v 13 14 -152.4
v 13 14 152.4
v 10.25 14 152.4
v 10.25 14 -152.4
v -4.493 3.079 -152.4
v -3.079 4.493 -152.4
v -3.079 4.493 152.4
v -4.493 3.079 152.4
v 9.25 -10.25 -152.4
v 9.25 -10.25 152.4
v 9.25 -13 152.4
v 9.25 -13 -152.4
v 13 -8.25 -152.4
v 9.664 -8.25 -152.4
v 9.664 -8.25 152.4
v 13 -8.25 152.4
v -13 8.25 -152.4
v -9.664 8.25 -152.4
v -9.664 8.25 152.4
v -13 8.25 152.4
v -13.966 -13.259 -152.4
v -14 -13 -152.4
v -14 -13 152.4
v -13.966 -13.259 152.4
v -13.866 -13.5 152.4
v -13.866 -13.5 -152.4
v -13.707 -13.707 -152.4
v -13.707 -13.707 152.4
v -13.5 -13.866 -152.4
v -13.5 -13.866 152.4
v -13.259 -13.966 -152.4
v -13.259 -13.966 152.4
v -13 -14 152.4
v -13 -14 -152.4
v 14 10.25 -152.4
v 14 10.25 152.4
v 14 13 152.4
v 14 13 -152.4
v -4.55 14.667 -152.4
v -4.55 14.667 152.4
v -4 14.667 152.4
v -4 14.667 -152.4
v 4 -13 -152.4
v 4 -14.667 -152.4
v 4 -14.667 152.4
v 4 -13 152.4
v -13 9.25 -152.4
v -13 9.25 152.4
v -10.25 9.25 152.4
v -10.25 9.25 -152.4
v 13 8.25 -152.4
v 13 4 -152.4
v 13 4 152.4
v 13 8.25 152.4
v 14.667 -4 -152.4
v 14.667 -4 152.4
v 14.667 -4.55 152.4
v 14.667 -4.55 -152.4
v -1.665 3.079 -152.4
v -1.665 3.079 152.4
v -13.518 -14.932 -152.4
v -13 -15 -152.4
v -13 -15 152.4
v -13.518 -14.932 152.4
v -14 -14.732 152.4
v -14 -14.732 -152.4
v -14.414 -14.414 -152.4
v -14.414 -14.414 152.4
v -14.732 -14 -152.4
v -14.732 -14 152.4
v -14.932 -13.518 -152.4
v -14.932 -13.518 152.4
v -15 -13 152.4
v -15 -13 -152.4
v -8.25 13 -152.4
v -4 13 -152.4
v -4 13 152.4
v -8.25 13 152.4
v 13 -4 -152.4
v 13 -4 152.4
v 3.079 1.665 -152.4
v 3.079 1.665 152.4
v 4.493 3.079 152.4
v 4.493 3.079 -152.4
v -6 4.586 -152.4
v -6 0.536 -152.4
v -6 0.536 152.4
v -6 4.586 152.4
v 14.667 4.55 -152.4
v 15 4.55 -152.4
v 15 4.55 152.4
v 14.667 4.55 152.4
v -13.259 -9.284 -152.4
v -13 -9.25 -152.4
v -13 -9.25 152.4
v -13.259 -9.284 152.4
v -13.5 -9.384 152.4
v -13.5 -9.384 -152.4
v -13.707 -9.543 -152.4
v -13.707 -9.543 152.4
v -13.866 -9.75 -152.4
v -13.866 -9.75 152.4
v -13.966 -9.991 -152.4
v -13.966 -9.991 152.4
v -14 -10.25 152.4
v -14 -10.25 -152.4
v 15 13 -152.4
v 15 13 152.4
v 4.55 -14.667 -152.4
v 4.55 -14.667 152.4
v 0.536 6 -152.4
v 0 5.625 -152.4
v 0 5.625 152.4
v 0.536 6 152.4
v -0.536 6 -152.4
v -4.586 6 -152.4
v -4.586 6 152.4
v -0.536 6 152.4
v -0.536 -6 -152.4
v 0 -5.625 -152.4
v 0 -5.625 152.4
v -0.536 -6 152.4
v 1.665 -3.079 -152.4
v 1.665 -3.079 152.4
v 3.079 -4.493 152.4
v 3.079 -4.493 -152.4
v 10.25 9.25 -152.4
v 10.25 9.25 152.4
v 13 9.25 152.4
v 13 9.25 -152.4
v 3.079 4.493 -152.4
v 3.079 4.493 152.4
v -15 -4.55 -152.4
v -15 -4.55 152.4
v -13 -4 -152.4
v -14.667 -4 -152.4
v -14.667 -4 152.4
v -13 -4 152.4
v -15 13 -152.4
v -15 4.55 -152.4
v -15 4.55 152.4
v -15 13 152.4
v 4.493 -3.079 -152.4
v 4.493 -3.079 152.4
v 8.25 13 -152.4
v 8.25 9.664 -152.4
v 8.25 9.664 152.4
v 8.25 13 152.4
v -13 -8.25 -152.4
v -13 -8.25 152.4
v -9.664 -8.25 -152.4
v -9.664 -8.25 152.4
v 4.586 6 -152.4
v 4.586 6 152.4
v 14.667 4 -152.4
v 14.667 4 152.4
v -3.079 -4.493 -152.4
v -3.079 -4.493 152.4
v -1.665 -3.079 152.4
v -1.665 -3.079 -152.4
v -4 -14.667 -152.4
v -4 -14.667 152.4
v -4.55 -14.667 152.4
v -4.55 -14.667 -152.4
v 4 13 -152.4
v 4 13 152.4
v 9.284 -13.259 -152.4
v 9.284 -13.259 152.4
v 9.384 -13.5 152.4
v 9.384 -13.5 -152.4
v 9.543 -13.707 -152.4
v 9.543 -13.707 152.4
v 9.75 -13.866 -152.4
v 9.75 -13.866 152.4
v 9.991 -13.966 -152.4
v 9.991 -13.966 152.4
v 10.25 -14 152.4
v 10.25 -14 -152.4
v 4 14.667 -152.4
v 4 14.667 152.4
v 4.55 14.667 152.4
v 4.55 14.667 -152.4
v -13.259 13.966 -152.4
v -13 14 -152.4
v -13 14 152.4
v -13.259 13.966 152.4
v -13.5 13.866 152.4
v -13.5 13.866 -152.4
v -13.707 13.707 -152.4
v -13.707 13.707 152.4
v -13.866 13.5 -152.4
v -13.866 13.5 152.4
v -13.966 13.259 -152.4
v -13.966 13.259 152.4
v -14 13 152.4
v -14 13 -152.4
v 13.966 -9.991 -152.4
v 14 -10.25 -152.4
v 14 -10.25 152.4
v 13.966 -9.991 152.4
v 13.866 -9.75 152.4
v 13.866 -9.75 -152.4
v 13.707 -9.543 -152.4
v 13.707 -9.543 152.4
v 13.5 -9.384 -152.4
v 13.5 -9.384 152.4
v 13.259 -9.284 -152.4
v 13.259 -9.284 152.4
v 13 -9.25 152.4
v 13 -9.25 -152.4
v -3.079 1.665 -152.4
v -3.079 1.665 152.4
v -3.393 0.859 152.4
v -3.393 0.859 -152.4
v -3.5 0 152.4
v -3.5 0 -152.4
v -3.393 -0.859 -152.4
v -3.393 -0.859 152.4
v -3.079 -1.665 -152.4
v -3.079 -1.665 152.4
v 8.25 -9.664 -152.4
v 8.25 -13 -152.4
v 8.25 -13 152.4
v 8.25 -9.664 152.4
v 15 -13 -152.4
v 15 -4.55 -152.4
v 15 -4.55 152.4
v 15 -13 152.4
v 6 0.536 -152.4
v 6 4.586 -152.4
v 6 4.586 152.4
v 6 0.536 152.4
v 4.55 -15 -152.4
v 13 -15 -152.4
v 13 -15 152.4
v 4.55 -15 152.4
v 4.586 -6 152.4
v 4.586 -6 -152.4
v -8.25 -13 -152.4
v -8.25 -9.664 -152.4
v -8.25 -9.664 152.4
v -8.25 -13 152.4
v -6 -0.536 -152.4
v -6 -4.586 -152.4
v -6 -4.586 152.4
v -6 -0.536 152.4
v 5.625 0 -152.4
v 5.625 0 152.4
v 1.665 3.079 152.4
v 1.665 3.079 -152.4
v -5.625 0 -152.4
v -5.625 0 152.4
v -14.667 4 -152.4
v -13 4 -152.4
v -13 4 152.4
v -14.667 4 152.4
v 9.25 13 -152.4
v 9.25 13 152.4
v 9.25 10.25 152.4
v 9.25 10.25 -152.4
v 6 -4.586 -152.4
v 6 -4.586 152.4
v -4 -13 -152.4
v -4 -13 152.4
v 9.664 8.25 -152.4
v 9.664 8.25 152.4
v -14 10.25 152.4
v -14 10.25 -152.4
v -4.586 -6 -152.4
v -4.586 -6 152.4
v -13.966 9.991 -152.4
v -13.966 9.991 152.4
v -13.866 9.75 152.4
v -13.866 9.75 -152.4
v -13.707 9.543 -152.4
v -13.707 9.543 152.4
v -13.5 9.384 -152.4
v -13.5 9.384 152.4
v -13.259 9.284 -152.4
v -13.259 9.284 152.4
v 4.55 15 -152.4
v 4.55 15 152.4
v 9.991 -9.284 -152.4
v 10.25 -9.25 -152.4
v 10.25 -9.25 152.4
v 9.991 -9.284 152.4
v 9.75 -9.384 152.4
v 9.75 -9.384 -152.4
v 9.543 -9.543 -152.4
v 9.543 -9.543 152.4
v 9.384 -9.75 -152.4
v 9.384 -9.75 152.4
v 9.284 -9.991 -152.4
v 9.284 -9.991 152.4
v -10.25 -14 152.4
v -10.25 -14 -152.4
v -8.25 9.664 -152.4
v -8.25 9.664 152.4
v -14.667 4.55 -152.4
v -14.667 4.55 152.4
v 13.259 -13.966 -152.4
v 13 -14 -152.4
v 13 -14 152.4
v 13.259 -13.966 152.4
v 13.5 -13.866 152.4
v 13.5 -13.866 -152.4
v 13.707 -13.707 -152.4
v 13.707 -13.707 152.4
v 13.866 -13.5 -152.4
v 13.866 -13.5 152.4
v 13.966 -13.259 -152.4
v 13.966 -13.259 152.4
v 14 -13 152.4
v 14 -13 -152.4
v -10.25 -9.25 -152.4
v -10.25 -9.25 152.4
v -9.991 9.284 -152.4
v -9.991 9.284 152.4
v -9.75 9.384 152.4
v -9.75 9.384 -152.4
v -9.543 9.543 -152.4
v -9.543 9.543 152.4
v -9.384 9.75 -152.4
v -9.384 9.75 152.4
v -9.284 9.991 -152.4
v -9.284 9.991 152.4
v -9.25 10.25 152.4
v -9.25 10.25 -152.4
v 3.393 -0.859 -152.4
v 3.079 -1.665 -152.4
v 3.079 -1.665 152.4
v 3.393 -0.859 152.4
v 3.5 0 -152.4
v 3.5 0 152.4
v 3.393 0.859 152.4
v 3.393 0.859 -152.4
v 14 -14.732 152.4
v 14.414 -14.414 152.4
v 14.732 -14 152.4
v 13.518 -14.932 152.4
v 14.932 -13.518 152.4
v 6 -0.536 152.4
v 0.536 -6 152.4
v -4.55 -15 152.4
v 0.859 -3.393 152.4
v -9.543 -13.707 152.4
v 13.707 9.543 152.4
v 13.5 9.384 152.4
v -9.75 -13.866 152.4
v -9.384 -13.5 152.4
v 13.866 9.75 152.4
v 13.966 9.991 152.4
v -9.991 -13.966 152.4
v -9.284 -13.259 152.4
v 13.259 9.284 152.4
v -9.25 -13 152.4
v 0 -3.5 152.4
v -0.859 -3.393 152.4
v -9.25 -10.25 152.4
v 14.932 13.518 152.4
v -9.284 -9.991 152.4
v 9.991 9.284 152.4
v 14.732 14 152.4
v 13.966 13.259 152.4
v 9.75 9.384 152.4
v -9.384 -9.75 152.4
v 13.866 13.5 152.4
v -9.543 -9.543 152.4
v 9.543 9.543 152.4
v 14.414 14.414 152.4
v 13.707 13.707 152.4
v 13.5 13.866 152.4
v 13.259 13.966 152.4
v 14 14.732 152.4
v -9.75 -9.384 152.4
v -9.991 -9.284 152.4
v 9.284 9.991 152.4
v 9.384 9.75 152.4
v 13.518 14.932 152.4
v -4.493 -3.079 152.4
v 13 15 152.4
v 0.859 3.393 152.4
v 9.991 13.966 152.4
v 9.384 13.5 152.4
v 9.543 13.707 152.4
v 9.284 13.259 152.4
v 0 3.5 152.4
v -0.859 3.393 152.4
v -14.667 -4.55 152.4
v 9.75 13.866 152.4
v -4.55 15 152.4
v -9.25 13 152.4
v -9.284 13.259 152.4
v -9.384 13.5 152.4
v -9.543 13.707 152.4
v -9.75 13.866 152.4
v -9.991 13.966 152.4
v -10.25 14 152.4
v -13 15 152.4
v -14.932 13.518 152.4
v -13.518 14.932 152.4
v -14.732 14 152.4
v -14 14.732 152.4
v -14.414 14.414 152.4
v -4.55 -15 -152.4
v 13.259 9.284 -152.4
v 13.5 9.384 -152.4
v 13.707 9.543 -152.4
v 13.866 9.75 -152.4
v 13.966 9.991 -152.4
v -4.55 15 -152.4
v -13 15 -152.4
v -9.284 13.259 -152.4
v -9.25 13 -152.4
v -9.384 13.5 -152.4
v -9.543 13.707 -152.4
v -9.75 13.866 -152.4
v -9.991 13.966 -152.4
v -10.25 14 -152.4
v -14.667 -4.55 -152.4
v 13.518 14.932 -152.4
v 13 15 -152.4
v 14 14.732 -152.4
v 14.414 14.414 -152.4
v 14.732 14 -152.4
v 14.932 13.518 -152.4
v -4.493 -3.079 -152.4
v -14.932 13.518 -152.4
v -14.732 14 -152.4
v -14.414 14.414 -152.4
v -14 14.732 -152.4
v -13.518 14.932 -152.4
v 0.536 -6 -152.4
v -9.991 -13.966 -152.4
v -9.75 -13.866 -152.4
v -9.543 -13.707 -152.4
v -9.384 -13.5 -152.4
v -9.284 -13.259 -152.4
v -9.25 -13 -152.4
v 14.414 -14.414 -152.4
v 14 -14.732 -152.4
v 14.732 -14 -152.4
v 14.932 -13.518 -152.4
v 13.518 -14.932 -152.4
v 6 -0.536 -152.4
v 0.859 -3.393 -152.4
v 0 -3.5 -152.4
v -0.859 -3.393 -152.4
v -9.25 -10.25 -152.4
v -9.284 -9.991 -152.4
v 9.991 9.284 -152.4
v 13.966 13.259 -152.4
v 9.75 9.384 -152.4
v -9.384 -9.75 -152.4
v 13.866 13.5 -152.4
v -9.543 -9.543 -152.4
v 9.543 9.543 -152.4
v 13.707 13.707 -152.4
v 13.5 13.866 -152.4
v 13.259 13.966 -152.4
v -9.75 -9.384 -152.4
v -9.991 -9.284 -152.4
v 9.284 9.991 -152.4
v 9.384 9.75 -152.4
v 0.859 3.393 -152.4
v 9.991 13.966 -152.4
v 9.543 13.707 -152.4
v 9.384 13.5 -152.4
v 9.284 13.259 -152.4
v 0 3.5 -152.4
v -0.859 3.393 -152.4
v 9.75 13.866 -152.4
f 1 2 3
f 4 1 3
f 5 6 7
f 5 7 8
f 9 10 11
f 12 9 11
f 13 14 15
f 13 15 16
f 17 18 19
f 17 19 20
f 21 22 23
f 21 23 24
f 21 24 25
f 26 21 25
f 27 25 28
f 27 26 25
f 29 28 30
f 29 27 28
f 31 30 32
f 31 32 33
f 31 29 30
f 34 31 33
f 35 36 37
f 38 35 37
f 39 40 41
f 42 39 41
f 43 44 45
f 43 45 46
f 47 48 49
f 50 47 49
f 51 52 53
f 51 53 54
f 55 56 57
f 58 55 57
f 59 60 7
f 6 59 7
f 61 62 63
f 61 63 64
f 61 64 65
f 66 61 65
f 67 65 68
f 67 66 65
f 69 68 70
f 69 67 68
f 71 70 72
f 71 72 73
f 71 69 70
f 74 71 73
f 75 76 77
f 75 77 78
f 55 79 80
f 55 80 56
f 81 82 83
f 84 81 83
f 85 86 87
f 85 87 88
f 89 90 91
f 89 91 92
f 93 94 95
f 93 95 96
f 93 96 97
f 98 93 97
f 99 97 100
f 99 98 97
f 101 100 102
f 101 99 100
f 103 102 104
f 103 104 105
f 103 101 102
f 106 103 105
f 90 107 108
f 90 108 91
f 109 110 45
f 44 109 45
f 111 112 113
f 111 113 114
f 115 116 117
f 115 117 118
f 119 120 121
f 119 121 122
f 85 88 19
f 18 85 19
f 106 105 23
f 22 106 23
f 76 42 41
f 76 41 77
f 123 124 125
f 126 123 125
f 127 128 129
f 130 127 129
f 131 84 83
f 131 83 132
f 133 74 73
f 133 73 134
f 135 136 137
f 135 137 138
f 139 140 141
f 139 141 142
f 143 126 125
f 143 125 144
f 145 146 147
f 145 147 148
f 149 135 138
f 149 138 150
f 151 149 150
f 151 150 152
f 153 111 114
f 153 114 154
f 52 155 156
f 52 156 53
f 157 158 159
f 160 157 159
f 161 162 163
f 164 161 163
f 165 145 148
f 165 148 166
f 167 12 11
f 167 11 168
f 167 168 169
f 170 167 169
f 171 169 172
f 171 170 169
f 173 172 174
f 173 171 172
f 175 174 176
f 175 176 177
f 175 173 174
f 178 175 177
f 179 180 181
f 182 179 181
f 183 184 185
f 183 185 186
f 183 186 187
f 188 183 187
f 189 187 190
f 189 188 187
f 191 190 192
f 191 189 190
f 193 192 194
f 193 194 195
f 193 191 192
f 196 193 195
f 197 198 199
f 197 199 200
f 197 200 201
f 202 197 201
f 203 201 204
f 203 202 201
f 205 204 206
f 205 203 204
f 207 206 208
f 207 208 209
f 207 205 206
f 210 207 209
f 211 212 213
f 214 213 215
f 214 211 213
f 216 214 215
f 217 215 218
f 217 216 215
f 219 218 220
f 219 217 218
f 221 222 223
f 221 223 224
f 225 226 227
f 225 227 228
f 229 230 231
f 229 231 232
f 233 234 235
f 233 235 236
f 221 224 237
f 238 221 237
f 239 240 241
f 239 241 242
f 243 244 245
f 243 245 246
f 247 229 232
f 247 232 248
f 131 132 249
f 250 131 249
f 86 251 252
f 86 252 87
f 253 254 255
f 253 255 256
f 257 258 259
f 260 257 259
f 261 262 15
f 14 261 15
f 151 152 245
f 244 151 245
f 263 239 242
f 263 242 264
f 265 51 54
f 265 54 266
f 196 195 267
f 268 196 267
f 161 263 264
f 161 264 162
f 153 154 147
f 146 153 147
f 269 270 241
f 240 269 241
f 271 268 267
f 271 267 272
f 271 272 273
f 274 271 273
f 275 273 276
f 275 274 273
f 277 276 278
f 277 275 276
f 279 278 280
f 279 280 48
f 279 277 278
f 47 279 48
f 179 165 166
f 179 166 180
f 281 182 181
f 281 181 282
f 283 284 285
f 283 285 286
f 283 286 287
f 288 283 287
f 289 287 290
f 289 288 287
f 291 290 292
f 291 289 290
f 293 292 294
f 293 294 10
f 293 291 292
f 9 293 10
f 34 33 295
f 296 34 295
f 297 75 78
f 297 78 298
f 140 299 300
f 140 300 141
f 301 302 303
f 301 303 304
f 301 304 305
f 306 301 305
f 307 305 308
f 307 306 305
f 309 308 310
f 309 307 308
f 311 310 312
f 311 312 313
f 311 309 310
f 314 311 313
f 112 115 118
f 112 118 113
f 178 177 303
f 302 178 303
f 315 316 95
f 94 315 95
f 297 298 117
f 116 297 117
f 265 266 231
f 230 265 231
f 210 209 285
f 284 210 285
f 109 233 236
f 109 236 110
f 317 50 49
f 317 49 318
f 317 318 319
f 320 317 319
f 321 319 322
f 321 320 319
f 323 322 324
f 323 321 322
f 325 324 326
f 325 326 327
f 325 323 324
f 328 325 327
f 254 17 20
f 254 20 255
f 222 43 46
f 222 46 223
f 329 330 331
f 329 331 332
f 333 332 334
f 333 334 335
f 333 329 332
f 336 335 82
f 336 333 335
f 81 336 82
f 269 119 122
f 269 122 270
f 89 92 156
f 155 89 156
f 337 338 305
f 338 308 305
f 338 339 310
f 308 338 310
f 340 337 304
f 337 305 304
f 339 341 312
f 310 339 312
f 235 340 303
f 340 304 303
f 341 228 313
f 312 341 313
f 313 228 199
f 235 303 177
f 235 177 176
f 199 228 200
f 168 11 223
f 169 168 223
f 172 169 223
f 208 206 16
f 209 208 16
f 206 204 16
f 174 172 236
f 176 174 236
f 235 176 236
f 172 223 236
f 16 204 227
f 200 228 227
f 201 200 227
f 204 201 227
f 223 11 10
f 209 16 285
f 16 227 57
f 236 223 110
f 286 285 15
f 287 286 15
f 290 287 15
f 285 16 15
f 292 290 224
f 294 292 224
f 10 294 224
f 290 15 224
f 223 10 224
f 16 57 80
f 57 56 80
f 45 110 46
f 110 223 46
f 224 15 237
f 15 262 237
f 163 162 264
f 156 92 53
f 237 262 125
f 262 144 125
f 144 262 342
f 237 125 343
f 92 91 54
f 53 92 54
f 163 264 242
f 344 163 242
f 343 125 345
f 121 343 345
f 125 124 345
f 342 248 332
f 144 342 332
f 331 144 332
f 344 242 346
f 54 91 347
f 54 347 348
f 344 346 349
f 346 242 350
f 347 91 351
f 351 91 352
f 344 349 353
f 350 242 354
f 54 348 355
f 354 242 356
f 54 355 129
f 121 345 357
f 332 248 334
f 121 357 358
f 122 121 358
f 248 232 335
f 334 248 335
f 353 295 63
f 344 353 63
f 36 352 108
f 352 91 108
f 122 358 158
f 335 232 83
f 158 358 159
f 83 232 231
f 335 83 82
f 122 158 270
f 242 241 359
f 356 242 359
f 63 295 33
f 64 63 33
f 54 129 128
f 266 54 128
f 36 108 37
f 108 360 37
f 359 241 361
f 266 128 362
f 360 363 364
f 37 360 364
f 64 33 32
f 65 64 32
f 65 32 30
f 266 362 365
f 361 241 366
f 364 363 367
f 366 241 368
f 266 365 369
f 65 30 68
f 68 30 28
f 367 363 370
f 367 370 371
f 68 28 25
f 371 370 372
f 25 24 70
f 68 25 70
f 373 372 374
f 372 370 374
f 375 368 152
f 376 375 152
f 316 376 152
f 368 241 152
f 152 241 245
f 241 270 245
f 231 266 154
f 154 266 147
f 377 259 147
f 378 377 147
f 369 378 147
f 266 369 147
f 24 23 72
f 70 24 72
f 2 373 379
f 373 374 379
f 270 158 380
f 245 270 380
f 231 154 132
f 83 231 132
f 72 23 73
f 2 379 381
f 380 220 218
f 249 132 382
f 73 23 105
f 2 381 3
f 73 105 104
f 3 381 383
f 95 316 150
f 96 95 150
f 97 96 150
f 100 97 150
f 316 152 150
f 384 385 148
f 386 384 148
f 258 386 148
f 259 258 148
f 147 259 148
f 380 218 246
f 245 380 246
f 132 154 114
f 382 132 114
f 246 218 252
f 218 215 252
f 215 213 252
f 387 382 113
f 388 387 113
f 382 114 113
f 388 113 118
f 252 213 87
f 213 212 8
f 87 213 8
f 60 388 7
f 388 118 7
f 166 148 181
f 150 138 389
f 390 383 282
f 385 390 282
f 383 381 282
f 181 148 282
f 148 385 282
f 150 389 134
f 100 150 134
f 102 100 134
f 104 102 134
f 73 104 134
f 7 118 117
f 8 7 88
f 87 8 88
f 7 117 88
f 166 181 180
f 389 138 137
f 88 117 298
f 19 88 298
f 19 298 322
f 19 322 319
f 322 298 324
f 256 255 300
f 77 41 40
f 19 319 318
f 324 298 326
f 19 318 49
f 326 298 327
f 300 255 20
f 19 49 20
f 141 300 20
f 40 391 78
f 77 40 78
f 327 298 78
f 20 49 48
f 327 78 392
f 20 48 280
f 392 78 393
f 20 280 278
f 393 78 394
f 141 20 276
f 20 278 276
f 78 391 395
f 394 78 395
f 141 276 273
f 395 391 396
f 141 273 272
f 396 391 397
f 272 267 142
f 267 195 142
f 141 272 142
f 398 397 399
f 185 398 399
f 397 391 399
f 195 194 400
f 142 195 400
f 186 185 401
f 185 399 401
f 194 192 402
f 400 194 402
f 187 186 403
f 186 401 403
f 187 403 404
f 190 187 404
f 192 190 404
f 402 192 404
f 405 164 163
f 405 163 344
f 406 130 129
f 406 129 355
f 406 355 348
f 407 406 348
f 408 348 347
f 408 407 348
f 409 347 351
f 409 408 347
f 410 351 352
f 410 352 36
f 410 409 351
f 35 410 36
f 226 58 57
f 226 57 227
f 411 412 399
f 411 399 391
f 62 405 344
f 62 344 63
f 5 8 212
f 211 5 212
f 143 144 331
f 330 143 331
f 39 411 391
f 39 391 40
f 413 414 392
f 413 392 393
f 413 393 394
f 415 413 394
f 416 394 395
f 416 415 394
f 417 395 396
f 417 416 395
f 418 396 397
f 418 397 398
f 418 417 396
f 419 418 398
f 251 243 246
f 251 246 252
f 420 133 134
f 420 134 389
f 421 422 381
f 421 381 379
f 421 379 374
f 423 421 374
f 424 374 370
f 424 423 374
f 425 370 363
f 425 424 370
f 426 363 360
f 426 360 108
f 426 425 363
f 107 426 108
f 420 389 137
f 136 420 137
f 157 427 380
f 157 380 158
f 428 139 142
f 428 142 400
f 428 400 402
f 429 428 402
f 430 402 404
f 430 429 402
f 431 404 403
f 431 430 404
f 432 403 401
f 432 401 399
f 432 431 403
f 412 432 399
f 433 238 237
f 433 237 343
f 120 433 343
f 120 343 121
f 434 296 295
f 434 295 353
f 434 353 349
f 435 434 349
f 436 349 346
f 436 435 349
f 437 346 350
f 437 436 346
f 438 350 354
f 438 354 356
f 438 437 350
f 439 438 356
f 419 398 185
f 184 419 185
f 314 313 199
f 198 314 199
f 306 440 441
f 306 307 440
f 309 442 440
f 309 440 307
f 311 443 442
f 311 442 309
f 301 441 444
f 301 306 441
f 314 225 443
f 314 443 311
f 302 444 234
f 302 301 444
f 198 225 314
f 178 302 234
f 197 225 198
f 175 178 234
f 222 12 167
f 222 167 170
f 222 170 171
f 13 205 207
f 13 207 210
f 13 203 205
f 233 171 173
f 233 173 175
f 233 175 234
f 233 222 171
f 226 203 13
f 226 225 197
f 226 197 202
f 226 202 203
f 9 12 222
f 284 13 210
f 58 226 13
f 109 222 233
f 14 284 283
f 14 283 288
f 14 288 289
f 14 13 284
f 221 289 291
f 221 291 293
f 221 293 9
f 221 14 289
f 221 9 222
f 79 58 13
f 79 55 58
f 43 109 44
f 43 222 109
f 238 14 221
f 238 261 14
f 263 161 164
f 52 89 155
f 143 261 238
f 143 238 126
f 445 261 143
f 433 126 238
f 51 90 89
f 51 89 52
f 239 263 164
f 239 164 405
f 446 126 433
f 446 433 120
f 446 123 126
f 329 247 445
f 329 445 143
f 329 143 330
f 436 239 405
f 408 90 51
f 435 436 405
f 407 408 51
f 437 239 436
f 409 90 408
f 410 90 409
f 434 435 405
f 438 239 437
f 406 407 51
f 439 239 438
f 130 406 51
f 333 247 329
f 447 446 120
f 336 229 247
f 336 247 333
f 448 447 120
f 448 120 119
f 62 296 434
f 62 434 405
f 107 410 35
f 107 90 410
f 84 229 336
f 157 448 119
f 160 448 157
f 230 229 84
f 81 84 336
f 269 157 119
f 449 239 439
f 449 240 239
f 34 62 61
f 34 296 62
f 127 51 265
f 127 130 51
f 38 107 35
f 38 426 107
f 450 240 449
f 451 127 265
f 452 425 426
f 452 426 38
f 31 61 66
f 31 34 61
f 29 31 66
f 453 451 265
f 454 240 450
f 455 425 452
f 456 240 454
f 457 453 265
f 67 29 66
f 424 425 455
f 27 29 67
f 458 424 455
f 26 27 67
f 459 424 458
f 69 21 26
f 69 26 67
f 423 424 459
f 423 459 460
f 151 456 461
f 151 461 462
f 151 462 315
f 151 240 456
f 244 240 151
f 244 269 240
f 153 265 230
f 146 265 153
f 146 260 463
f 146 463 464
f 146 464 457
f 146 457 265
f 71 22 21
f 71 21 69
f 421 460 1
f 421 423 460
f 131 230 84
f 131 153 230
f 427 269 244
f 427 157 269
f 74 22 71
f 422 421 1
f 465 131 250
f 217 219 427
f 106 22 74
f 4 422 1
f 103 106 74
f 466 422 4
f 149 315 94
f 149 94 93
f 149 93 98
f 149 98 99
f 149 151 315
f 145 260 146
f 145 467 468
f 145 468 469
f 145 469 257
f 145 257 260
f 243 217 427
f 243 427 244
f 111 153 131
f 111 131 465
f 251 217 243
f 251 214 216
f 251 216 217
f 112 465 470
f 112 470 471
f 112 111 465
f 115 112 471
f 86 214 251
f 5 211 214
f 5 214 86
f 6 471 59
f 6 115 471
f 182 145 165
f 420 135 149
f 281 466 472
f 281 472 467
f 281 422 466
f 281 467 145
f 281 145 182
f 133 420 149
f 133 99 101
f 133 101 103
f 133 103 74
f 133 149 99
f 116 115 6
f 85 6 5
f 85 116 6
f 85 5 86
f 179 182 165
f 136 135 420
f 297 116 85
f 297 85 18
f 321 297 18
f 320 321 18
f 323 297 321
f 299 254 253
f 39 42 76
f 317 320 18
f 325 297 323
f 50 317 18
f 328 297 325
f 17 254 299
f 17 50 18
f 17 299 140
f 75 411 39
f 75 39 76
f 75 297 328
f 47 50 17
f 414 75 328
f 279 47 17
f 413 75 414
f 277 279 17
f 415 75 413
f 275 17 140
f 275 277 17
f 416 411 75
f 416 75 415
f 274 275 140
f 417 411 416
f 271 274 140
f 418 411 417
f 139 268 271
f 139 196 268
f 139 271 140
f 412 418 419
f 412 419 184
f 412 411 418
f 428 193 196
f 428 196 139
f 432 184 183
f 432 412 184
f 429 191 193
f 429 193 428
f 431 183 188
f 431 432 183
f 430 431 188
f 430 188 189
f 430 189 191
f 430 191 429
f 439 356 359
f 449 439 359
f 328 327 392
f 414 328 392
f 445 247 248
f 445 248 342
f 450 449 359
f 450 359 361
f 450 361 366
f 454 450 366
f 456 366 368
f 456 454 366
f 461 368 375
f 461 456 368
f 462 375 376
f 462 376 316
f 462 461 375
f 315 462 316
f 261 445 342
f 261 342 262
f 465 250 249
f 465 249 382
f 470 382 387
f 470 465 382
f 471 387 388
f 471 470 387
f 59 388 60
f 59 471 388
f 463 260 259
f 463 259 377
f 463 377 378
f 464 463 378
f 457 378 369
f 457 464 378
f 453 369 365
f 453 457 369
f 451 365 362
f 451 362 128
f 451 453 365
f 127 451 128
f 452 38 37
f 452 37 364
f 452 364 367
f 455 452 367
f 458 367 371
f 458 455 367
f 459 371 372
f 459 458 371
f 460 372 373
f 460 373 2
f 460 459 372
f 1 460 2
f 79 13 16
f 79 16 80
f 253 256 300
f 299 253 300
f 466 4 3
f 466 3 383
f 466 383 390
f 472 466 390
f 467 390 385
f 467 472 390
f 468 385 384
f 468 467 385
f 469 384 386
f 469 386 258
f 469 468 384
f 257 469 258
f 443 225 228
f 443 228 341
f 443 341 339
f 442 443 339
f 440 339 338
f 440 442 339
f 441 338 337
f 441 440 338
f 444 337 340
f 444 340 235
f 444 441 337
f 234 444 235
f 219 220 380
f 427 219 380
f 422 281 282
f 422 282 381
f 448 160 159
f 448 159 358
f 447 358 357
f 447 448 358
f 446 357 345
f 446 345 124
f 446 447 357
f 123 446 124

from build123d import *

# Parameters (mm, degrees)
BOSS_EXTRUDE1_DEPTH      = 152.4
BOSS_EXTRUDE1_DEPTH_BACK = 152.4
SKETCH3_R                = 3.5
CUT_EXTRUDE1_DEPTH       = 306.537297232


with BuildPart() as part:
    # Sketch3 → Boss-Extrude1 (new, two sides: drawn at the far end of the back side and taken through both)
    with BuildSketch(Plane.XY.offset(-BOSS_EXTRUDE1_DEPTH_BACK)):
        with BuildLine():
            Line((-4.55, 15), (-4.55, 14.666666667))
            Line((-4.55, 14.666666667), (-4, 14.666666667))
            Line((-4, 14.666666667), (-4, 13))
            Line((-4, 13), (-8.25, 13))
            Line((-8.25, 13), (-8.25, 9.664213562))
            Line((-8.25, 9.664213562), (-4.585786438, 6))
            Line((-4.585786438, 6), (4.585786438, 6))
            Line((4.585786438, 6), (8.25, 9.664213562))
            Line((8.25, 9.664213562), (8.25, 13))
            Line((8.25, 13), (4, 13))
            Line((4, 13), (4, 14.666666667))
            Line((4, 14.666666667), (4.55, 14.666666667))
            Line((4.55, 14.666666667), (4.55, 15))
            Line((4.55, 15), (13, 15))
            ThreePointArc((13, 15), (14.414213562, 14.414213562), (15, 13))
            Line((15, 13), (15, 4.55))
            Line((15, 4.55), (14.666666667, 4.55))
            Line((14.666666667, 4.55), (14.666666667, 4))
            Line((14.666666667, 4), (13, 4))
            Line((13, 4), (13, 8.25))
            Line((13, 8.25), (9.664213562, 8.25))
            Line((9.664213562, 8.25), (6, 4.585786438))
            Line((6, 4.585786438), (6, -4.585786438))
            Line((6, -4.585786438), (9.664213562, -8.25))
            Line((9.664213562, -8.25), (13, -8.25))
            Line((13, -8.25), (13, -4))
            Line((13, -4), (14.666666667, -4))
            Line((14.666666667, -4), (14.666666667, -4.55))
            Line((14.666666667, -4.55), (15, -4.55))
            Line((15, -4.55), (15, -13))
            ThreePointArc((15, -13), (14.414213562, -14.414213562), (13, -15))
            Line((13, -15), (4.55, -15))
            Line((4.55, -15), (4.55, -14.666666667))
            Line((4.55, -14.666666667), (4, -14.666666667))
            Line((4, -14.666666667), (4, -13))
            Line((4, -13), (8.25, -13))
            Line((8.25, -13), (8.25, -9.664213562))
            Line((8.25, -9.664213562), (4.585786438, -6))
            Line((4.585786438, -6), (-4.585786438, -6))
            Line((-4.585786438, -6), (-8.25, -9.664213562))
            Line((-8.25, -9.664213562), (-8.25, -13))
            Line((-8.25, -13), (-4, -13))
            Line((-4, -13), (-4, -14.666666667))
            Line((-4, -14.666666667), (-4.55, -14.666666667))
            Line((-4.55, -14.666666667), (-4.55, -15))
            Line((-4.55, -15), (-13, -15))
            ThreePointArc((-13, -15), (-14.414213562, -14.414213562), (-15, -13))
            Line((-15, -13), (-15, -4.55))
            Line((-15, -4.55), (-14.666666667, -4.55))
            Line((-14.666666667, -4.55), (-14.666666667, -4))
            Line((-14.666666667, -4), (-13, -4))
            Line((-13, -4), (-13, -8.25))
            Line((-13, -8.25), (-9.664213562, -8.25))
            Line((-9.664213562, -8.25), (-6, -4.585786438))
            Line((-6, -4.585786438), (-6, 4.585786438))
            Line((-6, 4.585786438), (-9.664213562, 8.25))
            Line((-9.664213562, 8.25), (-13, 8.25))
            Line((-13, 8.25), (-13, 4))
            Line((-13, 4), (-14.666666667, 4))
            Line((-14.666666667, 4), (-14.666666667, 4.55))
            Line((-14.666666667, 4.55), (-15, 4.55))
            Line((-15, 4.55), (-15, 13))
            ThreePointArc((-15, 13), (-14.414213562, 14.414213562), (-13, 15))
            Line((-13, 15), (-4.55, 15))
        make_face()
        with Locations(Location((0, 0, 0), (0, 0, 180))):
            Circle(SKETCH3_R, mode=Mode.SUBTRACT)
        with BuildLine():
            Line((-13, 9.25), (-10.25, 9.25))
            ThreePointArc((-10.25, 9.25), (-9.542893219, 9.542893219), (-9.25, 10.25))
            Line((-9.25, 10.25), (-9.25, 13))
            ThreePointArc((-9.25, 13), (-9.542893219, 13.707106781), (-10.25, 14))
            Line((-10.25, 14), (-13, 14))
            ThreePointArc((-13, 14), (-13.707106781, 13.707106781), (-14, 13))
            Line((-14, 13), (-14, 10.25))
            ThreePointArc((-14, 10.25), (-13.707106781, 9.542893219), (-13, 9.25))
        make_face(mode=Mode.SUBTRACT)
        with BuildLine():
            Line((9.25, 13), (9.25, 10.25))
            ThreePointArc((9.25, 10.25), (9.542893219, 9.542893219), (10.25, 9.25))
            Line((10.25, 9.25), (13, 9.25))
            ThreePointArc((13, 9.25), (13.707106781, 9.542893219), (14, 10.25))
            Line((14, 10.25), (14, 13))
            ThreePointArc((14, 13), (13.707106781, 13.707106781), (13, 14))
            Line((13, 14), (10.25, 14))
            ThreePointArc((10.25, 14), (9.542893219, 13.707106781), (9.25, 13))
        make_face(mode=Mode.SUBTRACT)
        with BuildLine():
            Line((13, -9.25), (10.25, -9.25))
            ThreePointArc((10.25, -9.25), (9.542893219, -9.542893219), (9.25, -10.25))
            Line((9.25, -10.25), (9.25, -13))
            ThreePointArc((9.25, -13), (9.542893219, -13.707106781), (10.25, -14))
            Line((10.25, -14), (13, -14))
            ThreePointArc((13, -14), (13.707106781, -13.707106781), (14, -13))
            Line((14, -13), (14, -10.25))
            ThreePointArc((14, -10.25), (13.707106781, -9.542893219), (13, -9.25))
        make_face(mode=Mode.SUBTRACT)
        with BuildLine():
            Line((-9.25, -13), (-9.25, -10.25))
            ThreePointArc((-9.25, -10.25), (-9.542893219, -9.542893219), (-10.25, -9.25))
            Line((-10.25, -9.25), (-13, -9.25))
            ThreePointArc((-13, -9.25), (-13.707106781, -9.542893219), (-14, -10.25))
            Line((-14, -10.25), (-14, -13))
            ThreePointArc((-14, -13), (-13.707106781, -13.707106781), (-13, -14))
            Line((-13, -14), (-10.25, -14))
            ThreePointArc((-10.25, -14), (-9.542893219, -13.707106781), (-9.25, -13))
        make_face(mode=Mode.SUBTRACT)
    extrude(amount=BOSS_EXTRUDE1_DEPTH + BOSS_EXTRUDE1_DEPTH_BACK)

    # Sketch4 → Cut-Extrude1 (cut, through all)
    with BuildSketch(Plane.XY.offset(152.4)):
        Polygon((-0.535555503, 6), (0, 5.625), (0.535555503, 6), align=None)
        Polygon((6, 0.535555503), (5.625, 0), (6, -0.535555503), align=None)
        Polygon((0.535555503, -6), (0, -5.625), (-0.535555503, -6), align=None)
        Polygon((-6, -0.535555503), (-5.625, 0), (-6, 0.535555503), align=None)
        with BuildLine():
            Line((-4.493028589, 3.078815026), (-3.078815026, 1.664601464))
            ThreePointArc((-3.078815026, 1.664601464), (-2.474873734, 2.474873734), (-1.664601464, 3.078815026))
            Line((-1.664601464, 3.078815026), (-3.078815026, 4.493028589))
            Line((-3.078815026, 4.493028589), (-4.493028589, 3.078815026))
        make_face()
        with BuildLine():
            Line((3.078815026, 4.493028589), (1.664601464, 3.078815026))
            ThreePointArc((1.664601464, 3.078815026), (2.474873734, 2.474873734), (3.078815026, 1.664601464))
            Line((3.078815026, 1.664601464), (4.493028589, 3.078815026))
            Line((4.493028589, 3.078815026), (3.078815026, 4.493028589))
        make_face()
        with BuildLine():
            Line((4.493028589, -3.078815026), (3.078815026, -1.664601464))
            ThreePointArc((3.078815026, -1.664601464), (2.474873734, -2.474873734), (1.664601464, -3.078815026))
            Line((1.664601464, -3.078815026), (3.078815026, -4.493028589))
            Line((3.078815026, -4.493028589), (4.493028589, -3.078815026))
        make_face()
        with BuildLine():
            Line((-3.078815026, -4.493028589), (-1.664601464, -3.078815026))
            ThreePointArc((-1.664601464, -3.078815026), (-2.474873734, -2.474873734), (-3.078815026, -1.664601464))
            Line((-3.078815026, -1.664601464), (-4.493028589, -3.078815026))
            Line((-4.493028589, -3.078815026), (-3.078815026, -4.493028589))
        make_face()
    extrude(amount=-CUT_EXTRUDE1_DEPTH, mode=Mode.SUBTRACT)


solid = part.part
